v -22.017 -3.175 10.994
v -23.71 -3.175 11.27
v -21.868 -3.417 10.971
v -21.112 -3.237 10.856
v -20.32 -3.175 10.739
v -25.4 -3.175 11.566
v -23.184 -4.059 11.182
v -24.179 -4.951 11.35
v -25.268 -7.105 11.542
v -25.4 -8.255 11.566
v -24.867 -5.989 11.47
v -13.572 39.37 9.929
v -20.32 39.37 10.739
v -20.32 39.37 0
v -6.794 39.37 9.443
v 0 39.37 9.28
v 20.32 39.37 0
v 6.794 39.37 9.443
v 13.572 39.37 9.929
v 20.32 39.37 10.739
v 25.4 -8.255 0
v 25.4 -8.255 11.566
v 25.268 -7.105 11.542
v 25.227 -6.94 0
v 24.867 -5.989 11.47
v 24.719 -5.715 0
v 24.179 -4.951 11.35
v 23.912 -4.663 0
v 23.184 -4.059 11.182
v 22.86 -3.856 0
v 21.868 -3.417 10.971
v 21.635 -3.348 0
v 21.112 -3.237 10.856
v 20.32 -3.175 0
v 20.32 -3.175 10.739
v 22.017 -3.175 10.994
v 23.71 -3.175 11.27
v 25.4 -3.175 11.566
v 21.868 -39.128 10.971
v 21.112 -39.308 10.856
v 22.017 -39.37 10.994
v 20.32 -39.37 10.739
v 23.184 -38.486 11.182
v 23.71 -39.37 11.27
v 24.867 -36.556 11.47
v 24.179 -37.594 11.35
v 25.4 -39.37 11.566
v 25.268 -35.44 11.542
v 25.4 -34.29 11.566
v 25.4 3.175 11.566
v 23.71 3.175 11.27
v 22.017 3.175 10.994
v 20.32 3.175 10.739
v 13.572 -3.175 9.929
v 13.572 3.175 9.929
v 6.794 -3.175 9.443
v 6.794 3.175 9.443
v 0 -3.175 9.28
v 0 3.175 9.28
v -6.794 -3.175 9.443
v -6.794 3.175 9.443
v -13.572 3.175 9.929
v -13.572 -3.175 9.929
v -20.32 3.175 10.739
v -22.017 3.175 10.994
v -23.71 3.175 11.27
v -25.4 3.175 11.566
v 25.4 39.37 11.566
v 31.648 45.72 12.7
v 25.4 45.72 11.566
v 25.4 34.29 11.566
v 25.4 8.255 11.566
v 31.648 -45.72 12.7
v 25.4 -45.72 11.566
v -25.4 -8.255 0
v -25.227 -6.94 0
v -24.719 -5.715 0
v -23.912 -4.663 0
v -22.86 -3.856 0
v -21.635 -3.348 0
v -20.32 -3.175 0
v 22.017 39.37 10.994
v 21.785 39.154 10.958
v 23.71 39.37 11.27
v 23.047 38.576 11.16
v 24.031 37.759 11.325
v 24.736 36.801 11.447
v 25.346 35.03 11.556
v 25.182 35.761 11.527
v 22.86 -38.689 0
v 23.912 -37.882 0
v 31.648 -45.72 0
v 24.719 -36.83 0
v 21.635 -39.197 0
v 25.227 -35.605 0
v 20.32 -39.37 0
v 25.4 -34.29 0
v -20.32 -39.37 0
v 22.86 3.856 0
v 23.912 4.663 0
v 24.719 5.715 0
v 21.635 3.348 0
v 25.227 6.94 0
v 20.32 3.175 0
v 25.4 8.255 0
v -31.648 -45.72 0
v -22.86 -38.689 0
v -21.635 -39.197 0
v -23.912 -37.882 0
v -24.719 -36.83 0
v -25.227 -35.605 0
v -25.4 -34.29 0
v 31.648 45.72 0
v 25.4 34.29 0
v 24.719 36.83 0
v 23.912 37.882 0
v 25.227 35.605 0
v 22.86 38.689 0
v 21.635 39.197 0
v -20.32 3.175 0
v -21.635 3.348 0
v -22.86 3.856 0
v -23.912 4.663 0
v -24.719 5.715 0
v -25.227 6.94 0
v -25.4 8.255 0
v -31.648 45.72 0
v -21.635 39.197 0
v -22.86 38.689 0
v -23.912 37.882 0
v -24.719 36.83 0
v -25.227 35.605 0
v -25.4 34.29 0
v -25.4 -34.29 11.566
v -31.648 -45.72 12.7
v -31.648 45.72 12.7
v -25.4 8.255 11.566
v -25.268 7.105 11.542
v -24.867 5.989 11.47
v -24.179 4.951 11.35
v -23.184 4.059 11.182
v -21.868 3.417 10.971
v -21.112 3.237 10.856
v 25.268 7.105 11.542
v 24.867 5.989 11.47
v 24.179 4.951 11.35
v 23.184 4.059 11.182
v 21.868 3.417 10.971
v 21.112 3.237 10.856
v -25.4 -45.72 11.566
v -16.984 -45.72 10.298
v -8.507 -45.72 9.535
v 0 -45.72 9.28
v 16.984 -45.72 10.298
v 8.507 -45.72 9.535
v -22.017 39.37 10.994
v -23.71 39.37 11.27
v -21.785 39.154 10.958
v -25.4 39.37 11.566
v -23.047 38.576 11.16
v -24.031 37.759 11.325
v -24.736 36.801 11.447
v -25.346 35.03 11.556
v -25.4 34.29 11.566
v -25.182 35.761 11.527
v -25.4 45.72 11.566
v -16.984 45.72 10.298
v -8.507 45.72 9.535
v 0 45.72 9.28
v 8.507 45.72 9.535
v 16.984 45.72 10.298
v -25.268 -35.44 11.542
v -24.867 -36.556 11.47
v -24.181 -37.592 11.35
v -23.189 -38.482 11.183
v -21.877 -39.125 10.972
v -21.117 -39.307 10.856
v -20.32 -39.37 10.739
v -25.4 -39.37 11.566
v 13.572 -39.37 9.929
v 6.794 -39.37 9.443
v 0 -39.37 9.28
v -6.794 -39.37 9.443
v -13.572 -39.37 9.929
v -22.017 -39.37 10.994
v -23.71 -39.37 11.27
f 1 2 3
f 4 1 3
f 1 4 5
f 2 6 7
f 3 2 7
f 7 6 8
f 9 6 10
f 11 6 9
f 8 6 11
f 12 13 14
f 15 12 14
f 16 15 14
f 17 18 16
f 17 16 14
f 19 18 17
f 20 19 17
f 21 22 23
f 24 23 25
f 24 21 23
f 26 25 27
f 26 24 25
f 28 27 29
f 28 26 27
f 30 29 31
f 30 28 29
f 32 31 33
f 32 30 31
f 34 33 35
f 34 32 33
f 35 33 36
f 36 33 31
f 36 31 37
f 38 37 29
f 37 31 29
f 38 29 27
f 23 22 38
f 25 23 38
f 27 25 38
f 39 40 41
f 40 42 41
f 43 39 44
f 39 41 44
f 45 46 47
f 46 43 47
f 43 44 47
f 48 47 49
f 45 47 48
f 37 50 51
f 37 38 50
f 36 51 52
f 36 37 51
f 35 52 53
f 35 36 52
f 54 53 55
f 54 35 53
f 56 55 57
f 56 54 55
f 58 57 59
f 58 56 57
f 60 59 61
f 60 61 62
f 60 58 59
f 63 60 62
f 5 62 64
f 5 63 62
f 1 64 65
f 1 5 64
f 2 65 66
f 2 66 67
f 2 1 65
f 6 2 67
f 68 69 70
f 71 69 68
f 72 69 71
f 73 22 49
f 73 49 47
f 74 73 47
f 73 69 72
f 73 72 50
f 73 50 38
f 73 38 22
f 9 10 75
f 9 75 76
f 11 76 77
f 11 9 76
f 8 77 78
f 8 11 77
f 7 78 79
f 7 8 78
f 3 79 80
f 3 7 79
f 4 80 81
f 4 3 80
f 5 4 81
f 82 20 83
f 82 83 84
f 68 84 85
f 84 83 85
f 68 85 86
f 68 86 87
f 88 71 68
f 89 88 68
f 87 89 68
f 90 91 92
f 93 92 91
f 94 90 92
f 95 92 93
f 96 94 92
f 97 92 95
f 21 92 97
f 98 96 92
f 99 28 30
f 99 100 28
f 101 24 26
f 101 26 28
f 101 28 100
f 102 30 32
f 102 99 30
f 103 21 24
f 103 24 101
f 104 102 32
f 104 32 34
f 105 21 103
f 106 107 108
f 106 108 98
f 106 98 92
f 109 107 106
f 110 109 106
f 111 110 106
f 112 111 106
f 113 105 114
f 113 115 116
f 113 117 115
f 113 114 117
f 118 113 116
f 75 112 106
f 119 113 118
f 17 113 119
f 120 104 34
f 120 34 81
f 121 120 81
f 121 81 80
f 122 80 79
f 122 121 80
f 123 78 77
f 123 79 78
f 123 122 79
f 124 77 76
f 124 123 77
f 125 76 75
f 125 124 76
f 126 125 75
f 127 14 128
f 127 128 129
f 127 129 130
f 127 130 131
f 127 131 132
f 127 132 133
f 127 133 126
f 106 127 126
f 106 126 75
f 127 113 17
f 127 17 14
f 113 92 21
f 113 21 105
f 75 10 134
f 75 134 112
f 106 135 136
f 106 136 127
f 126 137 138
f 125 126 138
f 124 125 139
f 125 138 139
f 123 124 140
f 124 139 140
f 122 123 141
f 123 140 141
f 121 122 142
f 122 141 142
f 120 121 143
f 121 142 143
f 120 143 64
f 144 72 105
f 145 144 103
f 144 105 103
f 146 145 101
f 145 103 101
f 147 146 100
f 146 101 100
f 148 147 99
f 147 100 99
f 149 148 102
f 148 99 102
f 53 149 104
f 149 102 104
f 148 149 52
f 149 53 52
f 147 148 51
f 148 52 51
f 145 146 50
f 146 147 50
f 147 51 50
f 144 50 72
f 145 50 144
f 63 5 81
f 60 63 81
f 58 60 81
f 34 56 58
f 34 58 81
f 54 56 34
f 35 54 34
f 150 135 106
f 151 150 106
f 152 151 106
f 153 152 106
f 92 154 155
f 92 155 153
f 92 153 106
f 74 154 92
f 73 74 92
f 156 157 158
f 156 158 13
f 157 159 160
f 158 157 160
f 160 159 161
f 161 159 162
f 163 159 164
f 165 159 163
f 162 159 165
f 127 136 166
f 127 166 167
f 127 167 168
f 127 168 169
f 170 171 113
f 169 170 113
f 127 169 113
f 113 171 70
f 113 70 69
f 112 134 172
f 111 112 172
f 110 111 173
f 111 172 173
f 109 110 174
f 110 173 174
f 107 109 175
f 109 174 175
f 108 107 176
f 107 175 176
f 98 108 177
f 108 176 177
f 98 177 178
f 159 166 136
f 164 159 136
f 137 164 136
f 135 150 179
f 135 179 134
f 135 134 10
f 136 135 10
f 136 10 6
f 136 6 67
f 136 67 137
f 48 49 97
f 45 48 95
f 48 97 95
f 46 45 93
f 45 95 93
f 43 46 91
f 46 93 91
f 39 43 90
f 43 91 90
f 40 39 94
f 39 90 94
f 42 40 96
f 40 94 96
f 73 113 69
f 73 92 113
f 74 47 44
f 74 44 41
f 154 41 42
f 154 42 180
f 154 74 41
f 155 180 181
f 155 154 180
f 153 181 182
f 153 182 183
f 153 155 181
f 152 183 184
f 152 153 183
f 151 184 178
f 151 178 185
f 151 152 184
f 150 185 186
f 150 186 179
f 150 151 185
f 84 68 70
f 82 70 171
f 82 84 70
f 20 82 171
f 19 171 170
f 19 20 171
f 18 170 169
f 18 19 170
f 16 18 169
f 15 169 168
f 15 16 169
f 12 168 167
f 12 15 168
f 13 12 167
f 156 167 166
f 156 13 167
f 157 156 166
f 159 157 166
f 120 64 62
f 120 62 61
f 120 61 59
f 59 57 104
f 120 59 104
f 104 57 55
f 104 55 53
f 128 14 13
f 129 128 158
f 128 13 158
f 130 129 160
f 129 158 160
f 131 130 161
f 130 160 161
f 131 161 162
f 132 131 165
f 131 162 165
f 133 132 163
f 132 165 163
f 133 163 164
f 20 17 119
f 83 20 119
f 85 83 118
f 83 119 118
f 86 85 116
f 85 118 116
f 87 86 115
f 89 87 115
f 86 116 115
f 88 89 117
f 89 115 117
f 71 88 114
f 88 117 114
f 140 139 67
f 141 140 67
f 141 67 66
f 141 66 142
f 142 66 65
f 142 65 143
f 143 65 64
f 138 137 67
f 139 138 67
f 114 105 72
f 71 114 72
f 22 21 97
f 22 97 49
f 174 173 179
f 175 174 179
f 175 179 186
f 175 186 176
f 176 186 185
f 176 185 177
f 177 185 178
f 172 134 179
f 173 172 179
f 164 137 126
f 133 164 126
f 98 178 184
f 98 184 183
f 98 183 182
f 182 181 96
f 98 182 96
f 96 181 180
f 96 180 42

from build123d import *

# Parameters (mm, degrees)
F1_DEPTH     = 45.72
F2_DEPTH     = 39.37
F3_DEPTH     = 3.175
F4_T4_DEPTH  = 24.2661839103
F4_S5_R      = 142.2541111111
F4_T6_DEPTH  = 14
F4_T10_DEPTH = 24.2661839103
F4_S11_R     = 142.2541111111
F4_T12_DEPTH = 14
F4_T16_DEPTH = 24.2661839103
F4_S17_R     = 142.2541111111
F4_T18_DEPTH = 14
F4_T22_DEPTH = 24.2661839103
F4_S23_R     = 142.2541111111
F4_T24_DEPTH = 14
F4_T28_DEPTH = 24.2661839103
F4_S29_R     = 142.2541111111
F4_T30_DEPTH = 14
F4_T34_DEPTH = 24.2661839103
F4_S35_R     = 142.2541111111
F4_T36_DEPTH = 14
F4_T40_DEPTH = 24.2661839103
F4_S41_R     = 142.2541111111
F4_T42_DEPTH = 14
F4_T46_DEPTH = 24.2661839103
F4_S47_R     = 142.2541111111
F4_T48_DEPTH = 14


# Not quite as in the source:
# - a fillet or chamfer that OpenCascade refuses, or shapes differently, is made with other operations: its cross-section is extruded or revolved along the edge and cut away or added


with BuildPart() as f1:
    # F0 (on Front) → F1 (new body, symmetric)
    with BuildSketch(Plane.XZ):
        with BuildLine():
            ThreePointArc((25.4, 11.5661839103), (12.7513312638, 9.8528365344), (0, 9.2801839103))
            ThreePointArc((0, 9.2801839103), (-12.7513312638, 9.8528365344), (-25.4, 11.5661839103))
            Line((-25.4, 11.5661839103), (-25.4, 0))
            Line((-25.4, 0), (25.4, 0))
            Line((25.4, 0), (25.4, 11.5661839103))
        make_face()
        Polygon((-25.4, 0), (-25.4, 11.5661839103), (-31.6479565519, 12.7), (-31.6479565519, 0), align=None)
        Polygon((31.6479565519, 12.7), (25.4, 11.5661839103), (25.4, 0), (31.6479565519, 0), align=None)
    extrude(amount=F1_DEPTH, both=True)

    # F0 (on Front) → F2 (cut, symmetric)
    with BuildSketch(Plane.XZ):
        with BuildLine():
            ThreePointArc((25.4, 11.5661839103), (12.7513312638, 9.8528365344), (0, 9.2801839103))
            ThreePointArc((0, 9.2801839103), (-12.7513312638, 9.8528365344), (-25.4, 11.5661839103))
            Line((-25.4, 11.5661839103), (-25.4, 0))
            Line((-25.4, 0), (25.4, 0))
            Line((25.4, 0), (25.4, 11.5661839103))
        make_face()
    extrude(amount=F2_DEPTH, both=True, mode=Mode.SUBTRACT)

    # F0 (on Front) → F3 (join, symmetric)
    with BuildSketch(Plane.XZ):
        with BuildLine():
            ThreePointArc((25.4, 11.5661839103), (12.7513312638, 9.8528365344), (0, 9.2801839103))
            ThreePointArc((0, 9.2801839103), (-12.7513312638, 9.8528365344), (-25.4, 11.5661839103))
            Line((-25.4, 11.5661839103), (-25.4, 0))
            Line((-25.4, 0), (25.4, 0))
            Line((25.4, 0), (25.4, 11.5661839103))
        make_face()
    extrude(amount=F3_DEPTH, both=True)

    # F4: fillet of radius 5.08 on 8 edges, made by hand


with BuildPart() as f4_tool2:
    # F4_s3 → F4_t4 (new body)
    with BuildSketch(Plane.XY.offset(24.2661839103)):
        with BuildLine():
            ThreePointArc((-20.32, 39.37), (-23.9121024484, 37.8821024484), (-25.4, 34.29))
            Line((-25.4, 34.29), (-25.4, 39.37))
            Line((-25.4, 39.37), (-20.32, 39.37))
        make_face()
    extrude(amount=-F4_T4_DEPTH)

    # F4_s5 → F4_t6 (cut, symmetric)
    with BuildSketch(Plane.XZ.offset(-36.8)):
        with Locations((0, 151.5342950214)):
            Circle(F4_S5_R)
    extrude(amount=F4_T6_DEPTH, both=True, mode=Mode.SUBTRACT)


with BuildPart() as f1_1:
    add(f1.part)

    # F4_t1: union F4_tool2
    add(f4_tool2.part)


with BuildPart() as f4_tool8:
    # F4_s9 → F4_t10 (new body)
    with BuildSketch(Plane.XY):
        with BuildLine():
            ThreePointArc((20.32, 39.37), (23.9121024484, 37.8821024484), (25.4, 34.29))
            Line((25.4, 34.29), (25.4, 39.37))
            Line((25.4, 39.37), (20.32, 39.37))
        make_face()
    extrude(amount=F4_T10_DEPTH)

    # F4_s11 → F4_t12 (cut, symmetric)
    with BuildSketch(Plane.XZ.offset(-36.8)):
        with Locations((0, 151.5342950214)):
            Circle(F4_S11_R)
    extrude(amount=F4_T12_DEPTH, both=True, mode=Mode.SUBTRACT)


with BuildPart() as f1_2:
    add(f1_1.part)

    # F4_t7: union F4_tool8
    add(f4_tool8.part)


with BuildPart() as f4_tool14:
    # F4_s15 → F4_t16 (new body)
    with BuildSketch(Plane.XY):
        with BuildLine():
            ThreePointArc((25.4, -8.255), (23.9121024484, -4.6628975516), (20.32, -3.175))
            Line((20.32, -3.175), (25.4, -3.175))
            Line((25.4, -3.175), (25.4, -8.255))
        make_face()
    extrude(amount=F4_T16_DEPTH)

    # F4_s17 → F4_t18 (cut, symmetric)
    with BuildSketch(Plane.XZ.offset(5.7)):
        with Locations((0, 151.5342950214)):
            Circle(F4_S17_R)
    extrude(amount=F4_T18_DEPTH, both=True, mode=Mode.SUBTRACT)


with BuildPart() as f1_3:
    add(f1_2.part)

    # F4_t13: union F4_tool14
    add(f4_tool14.part)


with BuildPart() as f4_tool20:
    # F4_s21 → F4_t22 (new body)
    with BuildSketch(Plane.XY.offset(24.2661839103)):
        with BuildLine():
            ThreePointArc((-25.4, -8.255), (-23.9121024484, -4.6628975516), (-20.32, -3.175))
            Line((-20.32, -3.175), (-25.4, -3.175))
            Line((-25.4, -3.175), (-25.4, -8.255))
        make_face()
    extrude(amount=-F4_T22_DEPTH)

    # F4_s23 → F4_t24 (cut, symmetric)
    with BuildSketch(Plane.XZ.offset(5.7)):
        with Locations((0, 151.5342950214)):
            Circle(F4_S23_R)
    extrude(amount=F4_T24_DEPTH, both=True, mode=Mode.SUBTRACT)


with BuildPart() as f1_4:
    add(f1_3.part)

    # F4_t19: union F4_tool20
    add(f4_tool20.part)


with BuildPart() as f4_tool26:
    # F4_s27 → F4_t28 (new body)
    with BuildSketch(Plane.XY):
        with BuildLine():
            ThreePointArc((25.4, 8.255), (23.9121024484, 4.6628975516), (20.32, 3.175))
            Line((20.32, 3.175), (25.4, 3.175))
            Line((25.4, 3.175), (25.4, 8.255))
        make_face()
    extrude(amount=F4_T28_DEPTH)

    # F4_s29 → F4_t30 (cut, symmetric)
    with BuildSketch(Plane.XZ.offset(-5.7)):
        with Locations((0, 151.5342950214)):
            Circle(F4_S29_R)
    extrude(amount=F4_T30_DEPTH, both=True, mode=Mode.SUBTRACT)


with BuildPart() as f1_5:
    add(f1_4.part)

    # F4_t25: union F4_tool26
    add(f4_tool26.part)


with BuildPart() as f4_tool32:
    # F4_s33 → F4_t34 (new body)
    with BuildSketch(Plane.XY):
        with BuildLine():
            ThreePointArc((25.4, -34.29), (23.9121024484, -37.8821024484), (20.32, -39.37))
            Line((20.32, -39.37), (25.4, -39.37))
            Line((25.4, -39.37), (25.4, -34.29))
        make_face()
    extrude(amount=F4_T34_DEPTH)

    # F4_s35 → F4_t36 (cut, symmetric)
    with BuildSketch(Plane.XZ.offset(36.8)):
        with Locations((0, 151.5342950214)):
            Circle(F4_S35_R)
    extrude(amount=F4_T36_DEPTH, both=True, mode=Mode.SUBTRACT)


with BuildPart() as f1_6:
    add(f1_5.part)

    # F4_t31: union F4_tool32
    add(f4_tool32.part)


with BuildPart() as f4_tool38:
    # F4_s39 → F4_t40 (new body)
    with BuildSketch(Plane.XY.offset(24.2661839103)):
        with BuildLine():
            ThreePointArc((-25.4, -34.29), (-23.9121024484, -37.8821024484), (-20.32, -39.37))
            Line((-20.32, -39.37), (-25.4, -39.37))
            Line((-25.4, -39.37), (-25.4, -34.29))
        make_face()
    extrude(amount=-F4_T40_DEPTH)

    # F4_s41 → F4_t42 (cut, symmetric)
    with BuildSketch(Plane.XZ.offset(36.8)):
        with Locations((0, 151.5342950214)):
            Circle(F4_S41_R)
    extrude(amount=F4_T42_DEPTH, both=True, mode=Mode.SUBTRACT)


with BuildPart() as f1_7:
    add(f1_6.part)

    # F4_t37: union F4_tool38
    add(f4_tool38.part)


with BuildPart() as f4_tool44:
    # F4_s45 → F4_t46 (new body)
    with BuildSketch(Plane.XY.offset(24.2661839103)):
        with BuildLine():
            ThreePointArc((-25.4, 8.255), (-23.9121024484, 4.6628975516), (-20.32, 3.175))
            Line((-20.32, 3.175), (-25.4, 3.175))
            Line((-25.4, 3.175), (-25.4, 8.255))
        make_face()
    extrude(amount=-F4_T46_DEPTH)

    # F4_s47 → F4_t48 (cut, symmetric)
    with BuildSketch(Plane.XZ.offset(-5.7)):
        with Locations((0, 151.5342950214)):
            Circle(F4_S47_R)
    extrude(amount=F4_T48_DEPTH, both=True, mode=Mode.SUBTRACT)


with BuildPart() as f1_8:
    add(f1_7.part)

    # F4_t43: union F4_tool44
    add(f4_tool44.part)


solid = f1_8.part
